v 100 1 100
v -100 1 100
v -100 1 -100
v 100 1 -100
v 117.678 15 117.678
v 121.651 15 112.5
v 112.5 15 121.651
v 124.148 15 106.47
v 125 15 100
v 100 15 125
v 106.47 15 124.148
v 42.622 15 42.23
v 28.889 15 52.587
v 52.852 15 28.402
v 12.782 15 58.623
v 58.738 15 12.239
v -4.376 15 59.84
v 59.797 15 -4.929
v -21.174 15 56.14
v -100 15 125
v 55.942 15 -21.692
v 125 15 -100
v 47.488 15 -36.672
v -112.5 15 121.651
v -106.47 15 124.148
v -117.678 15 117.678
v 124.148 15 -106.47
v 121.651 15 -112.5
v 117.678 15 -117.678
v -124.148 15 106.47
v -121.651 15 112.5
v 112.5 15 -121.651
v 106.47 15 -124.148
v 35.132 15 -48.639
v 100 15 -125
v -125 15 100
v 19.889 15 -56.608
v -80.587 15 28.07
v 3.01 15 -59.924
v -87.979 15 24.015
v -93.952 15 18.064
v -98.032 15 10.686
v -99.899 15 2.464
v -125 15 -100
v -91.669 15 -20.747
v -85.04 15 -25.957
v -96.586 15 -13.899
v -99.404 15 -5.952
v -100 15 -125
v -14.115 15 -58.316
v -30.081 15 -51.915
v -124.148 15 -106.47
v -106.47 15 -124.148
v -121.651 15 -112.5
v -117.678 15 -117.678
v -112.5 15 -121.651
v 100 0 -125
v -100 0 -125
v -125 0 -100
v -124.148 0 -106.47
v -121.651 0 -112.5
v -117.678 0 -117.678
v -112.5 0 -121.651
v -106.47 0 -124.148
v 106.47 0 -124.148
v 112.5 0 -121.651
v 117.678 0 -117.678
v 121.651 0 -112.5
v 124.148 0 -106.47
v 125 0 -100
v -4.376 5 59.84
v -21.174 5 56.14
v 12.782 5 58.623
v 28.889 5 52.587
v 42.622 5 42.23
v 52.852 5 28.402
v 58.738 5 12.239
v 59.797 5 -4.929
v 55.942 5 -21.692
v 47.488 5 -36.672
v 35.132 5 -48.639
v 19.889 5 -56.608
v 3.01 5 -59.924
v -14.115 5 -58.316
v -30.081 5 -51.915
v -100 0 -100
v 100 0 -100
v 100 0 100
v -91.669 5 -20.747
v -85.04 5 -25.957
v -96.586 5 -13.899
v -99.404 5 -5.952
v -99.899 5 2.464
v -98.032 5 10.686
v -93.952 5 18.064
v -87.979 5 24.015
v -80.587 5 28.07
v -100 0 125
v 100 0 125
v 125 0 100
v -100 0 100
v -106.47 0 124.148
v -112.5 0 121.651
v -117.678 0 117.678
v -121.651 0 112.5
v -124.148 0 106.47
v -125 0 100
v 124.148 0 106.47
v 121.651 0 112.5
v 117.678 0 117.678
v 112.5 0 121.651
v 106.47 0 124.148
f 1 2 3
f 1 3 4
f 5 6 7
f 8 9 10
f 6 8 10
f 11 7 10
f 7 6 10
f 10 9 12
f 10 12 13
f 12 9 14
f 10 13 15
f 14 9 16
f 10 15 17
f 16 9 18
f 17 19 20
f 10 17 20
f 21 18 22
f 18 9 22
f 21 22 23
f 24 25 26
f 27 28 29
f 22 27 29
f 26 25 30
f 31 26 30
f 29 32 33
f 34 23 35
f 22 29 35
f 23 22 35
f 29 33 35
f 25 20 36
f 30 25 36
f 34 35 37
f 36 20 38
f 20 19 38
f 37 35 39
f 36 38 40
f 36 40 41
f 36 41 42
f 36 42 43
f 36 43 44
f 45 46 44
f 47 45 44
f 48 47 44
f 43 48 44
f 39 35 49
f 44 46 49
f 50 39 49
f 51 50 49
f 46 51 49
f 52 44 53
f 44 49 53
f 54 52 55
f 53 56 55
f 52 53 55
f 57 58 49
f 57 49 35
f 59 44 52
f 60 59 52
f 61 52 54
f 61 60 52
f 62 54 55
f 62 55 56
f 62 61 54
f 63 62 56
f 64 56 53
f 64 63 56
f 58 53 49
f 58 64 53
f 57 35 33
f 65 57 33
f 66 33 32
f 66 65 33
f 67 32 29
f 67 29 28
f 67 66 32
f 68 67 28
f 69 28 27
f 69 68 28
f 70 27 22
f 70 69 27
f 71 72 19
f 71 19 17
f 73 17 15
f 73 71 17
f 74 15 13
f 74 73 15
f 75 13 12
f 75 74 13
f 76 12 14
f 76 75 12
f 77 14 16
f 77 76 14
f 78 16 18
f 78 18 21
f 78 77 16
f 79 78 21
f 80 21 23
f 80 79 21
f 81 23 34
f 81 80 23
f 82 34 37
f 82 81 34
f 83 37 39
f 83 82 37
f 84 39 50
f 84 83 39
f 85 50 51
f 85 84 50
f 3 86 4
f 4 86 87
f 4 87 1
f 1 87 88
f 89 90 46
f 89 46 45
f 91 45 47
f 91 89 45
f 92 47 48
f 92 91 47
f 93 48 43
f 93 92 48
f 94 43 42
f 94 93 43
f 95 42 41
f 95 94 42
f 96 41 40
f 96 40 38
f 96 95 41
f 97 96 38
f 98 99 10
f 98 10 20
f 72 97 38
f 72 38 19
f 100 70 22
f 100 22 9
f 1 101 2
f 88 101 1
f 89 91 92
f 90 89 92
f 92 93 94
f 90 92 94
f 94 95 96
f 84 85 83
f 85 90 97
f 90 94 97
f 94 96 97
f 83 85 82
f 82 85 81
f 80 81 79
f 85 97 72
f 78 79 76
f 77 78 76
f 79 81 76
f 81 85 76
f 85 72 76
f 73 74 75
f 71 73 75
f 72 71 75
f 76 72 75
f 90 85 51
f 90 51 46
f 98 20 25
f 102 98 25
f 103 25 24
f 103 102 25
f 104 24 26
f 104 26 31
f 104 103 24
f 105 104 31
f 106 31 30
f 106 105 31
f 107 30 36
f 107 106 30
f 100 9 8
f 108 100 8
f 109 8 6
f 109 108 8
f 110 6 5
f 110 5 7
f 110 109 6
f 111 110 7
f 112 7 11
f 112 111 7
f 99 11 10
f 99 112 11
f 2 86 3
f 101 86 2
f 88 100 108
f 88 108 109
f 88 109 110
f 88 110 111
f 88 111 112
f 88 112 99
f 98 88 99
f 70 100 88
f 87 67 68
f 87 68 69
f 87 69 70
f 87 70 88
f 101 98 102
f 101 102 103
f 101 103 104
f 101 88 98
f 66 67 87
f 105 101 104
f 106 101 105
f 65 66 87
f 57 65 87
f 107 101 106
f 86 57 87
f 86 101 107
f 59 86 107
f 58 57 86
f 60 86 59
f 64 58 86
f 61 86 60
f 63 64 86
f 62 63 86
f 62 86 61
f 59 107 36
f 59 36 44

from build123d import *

# Parameters (mm, degrees)
BOSS_EXTRUDE1_DEPTH = 15
BOSS_EXTRUDE2_DEPTH = 5
SKETCH4_W           = 200
SKETCH4_H           = 200
CUT_EXTRUDE1_DEPTH  = 1


with BuildPart() as part:
    # Sketch1 → Boss-Extrude1 (new body)
    with BuildSketch(Plane(origin=(0, 0, 0), x_dir=(1, 0, 0), z_dir=(0, 1, 0))):
        with BuildLine():
            Line((-100, 125), (100, 125))
            ThreePointArc((100, 125), (117.67766953, 117.67766953), (125, 100))
            Line((125, 100), (125, -100))
            ThreePointArc((125, -100), (117.67766953, -117.67766953), (100, -125))
            Line((100, -125), (-100, -125))
            ThreePointArc((-100, -125), (-117.67766953, -117.67766953), (-125, -100))
            Line((-125, -100), (-125, 100))
            ThreePointArc((-125, 100), (-117.67766953, 117.67766953), (-100, 125))
        make_face()
        with BuildLine():
            Line((-30.080566992, 51.914925498), (-85.040283496, 25.957462749))
            ThreePointArc((-85.040283496, 25.957462749), (-99.898608517, -2.464388108), (-80.587095233, -28.069795413))
            Line((-80.587095233, -28.069795413), (-21.174190466, -56.139590826))
            ThreePointArc((-21.174190466, -56.139590826), (59.797217034, 4.928776216), (-30.080566992, 51.914925498))
        make_face(mode=Mode.SUBTRACT)
    extrude(amount=BOSS_EXTRUDE1_DEPTH)

    # Sketch2 → Boss-Extrude2 (add)
    with BuildSketch(Plane.XZ):
        with BuildLine():
            Line((100, 125), (-100, 125))
            ThreePointArc((-100, 125), (-117.67766953, 117.67766953), (-125, 100))
            Line((-125, 100), (-125, -100))
            ThreePointArc((-125, -100), (-117.67766953, -117.67766953), (-100, -125))
            Line((-100, -125), (100, -125))
            ThreePointArc((100, -125), (117.67766953, -117.67766953), (125, -100))
            Line((125, -100), (125, 100))
            ThreePointArc((125, 100), (117.67766953, 117.67766953), (100, 125))
        make_face()
    extrude(amount=-BOSS_EXTRUDE2_DEPTH)

    # Sketch4 → Cut-Extrude1 (cut)
    with BuildSketch(Plane.XZ):
        Rectangle(SKETCH4_W, SKETCH4_H)
    extrude(amount=-CUT_EXTRUDE1_DEPTH, mode=Mode.SUBTRACT)


solid = part.part
